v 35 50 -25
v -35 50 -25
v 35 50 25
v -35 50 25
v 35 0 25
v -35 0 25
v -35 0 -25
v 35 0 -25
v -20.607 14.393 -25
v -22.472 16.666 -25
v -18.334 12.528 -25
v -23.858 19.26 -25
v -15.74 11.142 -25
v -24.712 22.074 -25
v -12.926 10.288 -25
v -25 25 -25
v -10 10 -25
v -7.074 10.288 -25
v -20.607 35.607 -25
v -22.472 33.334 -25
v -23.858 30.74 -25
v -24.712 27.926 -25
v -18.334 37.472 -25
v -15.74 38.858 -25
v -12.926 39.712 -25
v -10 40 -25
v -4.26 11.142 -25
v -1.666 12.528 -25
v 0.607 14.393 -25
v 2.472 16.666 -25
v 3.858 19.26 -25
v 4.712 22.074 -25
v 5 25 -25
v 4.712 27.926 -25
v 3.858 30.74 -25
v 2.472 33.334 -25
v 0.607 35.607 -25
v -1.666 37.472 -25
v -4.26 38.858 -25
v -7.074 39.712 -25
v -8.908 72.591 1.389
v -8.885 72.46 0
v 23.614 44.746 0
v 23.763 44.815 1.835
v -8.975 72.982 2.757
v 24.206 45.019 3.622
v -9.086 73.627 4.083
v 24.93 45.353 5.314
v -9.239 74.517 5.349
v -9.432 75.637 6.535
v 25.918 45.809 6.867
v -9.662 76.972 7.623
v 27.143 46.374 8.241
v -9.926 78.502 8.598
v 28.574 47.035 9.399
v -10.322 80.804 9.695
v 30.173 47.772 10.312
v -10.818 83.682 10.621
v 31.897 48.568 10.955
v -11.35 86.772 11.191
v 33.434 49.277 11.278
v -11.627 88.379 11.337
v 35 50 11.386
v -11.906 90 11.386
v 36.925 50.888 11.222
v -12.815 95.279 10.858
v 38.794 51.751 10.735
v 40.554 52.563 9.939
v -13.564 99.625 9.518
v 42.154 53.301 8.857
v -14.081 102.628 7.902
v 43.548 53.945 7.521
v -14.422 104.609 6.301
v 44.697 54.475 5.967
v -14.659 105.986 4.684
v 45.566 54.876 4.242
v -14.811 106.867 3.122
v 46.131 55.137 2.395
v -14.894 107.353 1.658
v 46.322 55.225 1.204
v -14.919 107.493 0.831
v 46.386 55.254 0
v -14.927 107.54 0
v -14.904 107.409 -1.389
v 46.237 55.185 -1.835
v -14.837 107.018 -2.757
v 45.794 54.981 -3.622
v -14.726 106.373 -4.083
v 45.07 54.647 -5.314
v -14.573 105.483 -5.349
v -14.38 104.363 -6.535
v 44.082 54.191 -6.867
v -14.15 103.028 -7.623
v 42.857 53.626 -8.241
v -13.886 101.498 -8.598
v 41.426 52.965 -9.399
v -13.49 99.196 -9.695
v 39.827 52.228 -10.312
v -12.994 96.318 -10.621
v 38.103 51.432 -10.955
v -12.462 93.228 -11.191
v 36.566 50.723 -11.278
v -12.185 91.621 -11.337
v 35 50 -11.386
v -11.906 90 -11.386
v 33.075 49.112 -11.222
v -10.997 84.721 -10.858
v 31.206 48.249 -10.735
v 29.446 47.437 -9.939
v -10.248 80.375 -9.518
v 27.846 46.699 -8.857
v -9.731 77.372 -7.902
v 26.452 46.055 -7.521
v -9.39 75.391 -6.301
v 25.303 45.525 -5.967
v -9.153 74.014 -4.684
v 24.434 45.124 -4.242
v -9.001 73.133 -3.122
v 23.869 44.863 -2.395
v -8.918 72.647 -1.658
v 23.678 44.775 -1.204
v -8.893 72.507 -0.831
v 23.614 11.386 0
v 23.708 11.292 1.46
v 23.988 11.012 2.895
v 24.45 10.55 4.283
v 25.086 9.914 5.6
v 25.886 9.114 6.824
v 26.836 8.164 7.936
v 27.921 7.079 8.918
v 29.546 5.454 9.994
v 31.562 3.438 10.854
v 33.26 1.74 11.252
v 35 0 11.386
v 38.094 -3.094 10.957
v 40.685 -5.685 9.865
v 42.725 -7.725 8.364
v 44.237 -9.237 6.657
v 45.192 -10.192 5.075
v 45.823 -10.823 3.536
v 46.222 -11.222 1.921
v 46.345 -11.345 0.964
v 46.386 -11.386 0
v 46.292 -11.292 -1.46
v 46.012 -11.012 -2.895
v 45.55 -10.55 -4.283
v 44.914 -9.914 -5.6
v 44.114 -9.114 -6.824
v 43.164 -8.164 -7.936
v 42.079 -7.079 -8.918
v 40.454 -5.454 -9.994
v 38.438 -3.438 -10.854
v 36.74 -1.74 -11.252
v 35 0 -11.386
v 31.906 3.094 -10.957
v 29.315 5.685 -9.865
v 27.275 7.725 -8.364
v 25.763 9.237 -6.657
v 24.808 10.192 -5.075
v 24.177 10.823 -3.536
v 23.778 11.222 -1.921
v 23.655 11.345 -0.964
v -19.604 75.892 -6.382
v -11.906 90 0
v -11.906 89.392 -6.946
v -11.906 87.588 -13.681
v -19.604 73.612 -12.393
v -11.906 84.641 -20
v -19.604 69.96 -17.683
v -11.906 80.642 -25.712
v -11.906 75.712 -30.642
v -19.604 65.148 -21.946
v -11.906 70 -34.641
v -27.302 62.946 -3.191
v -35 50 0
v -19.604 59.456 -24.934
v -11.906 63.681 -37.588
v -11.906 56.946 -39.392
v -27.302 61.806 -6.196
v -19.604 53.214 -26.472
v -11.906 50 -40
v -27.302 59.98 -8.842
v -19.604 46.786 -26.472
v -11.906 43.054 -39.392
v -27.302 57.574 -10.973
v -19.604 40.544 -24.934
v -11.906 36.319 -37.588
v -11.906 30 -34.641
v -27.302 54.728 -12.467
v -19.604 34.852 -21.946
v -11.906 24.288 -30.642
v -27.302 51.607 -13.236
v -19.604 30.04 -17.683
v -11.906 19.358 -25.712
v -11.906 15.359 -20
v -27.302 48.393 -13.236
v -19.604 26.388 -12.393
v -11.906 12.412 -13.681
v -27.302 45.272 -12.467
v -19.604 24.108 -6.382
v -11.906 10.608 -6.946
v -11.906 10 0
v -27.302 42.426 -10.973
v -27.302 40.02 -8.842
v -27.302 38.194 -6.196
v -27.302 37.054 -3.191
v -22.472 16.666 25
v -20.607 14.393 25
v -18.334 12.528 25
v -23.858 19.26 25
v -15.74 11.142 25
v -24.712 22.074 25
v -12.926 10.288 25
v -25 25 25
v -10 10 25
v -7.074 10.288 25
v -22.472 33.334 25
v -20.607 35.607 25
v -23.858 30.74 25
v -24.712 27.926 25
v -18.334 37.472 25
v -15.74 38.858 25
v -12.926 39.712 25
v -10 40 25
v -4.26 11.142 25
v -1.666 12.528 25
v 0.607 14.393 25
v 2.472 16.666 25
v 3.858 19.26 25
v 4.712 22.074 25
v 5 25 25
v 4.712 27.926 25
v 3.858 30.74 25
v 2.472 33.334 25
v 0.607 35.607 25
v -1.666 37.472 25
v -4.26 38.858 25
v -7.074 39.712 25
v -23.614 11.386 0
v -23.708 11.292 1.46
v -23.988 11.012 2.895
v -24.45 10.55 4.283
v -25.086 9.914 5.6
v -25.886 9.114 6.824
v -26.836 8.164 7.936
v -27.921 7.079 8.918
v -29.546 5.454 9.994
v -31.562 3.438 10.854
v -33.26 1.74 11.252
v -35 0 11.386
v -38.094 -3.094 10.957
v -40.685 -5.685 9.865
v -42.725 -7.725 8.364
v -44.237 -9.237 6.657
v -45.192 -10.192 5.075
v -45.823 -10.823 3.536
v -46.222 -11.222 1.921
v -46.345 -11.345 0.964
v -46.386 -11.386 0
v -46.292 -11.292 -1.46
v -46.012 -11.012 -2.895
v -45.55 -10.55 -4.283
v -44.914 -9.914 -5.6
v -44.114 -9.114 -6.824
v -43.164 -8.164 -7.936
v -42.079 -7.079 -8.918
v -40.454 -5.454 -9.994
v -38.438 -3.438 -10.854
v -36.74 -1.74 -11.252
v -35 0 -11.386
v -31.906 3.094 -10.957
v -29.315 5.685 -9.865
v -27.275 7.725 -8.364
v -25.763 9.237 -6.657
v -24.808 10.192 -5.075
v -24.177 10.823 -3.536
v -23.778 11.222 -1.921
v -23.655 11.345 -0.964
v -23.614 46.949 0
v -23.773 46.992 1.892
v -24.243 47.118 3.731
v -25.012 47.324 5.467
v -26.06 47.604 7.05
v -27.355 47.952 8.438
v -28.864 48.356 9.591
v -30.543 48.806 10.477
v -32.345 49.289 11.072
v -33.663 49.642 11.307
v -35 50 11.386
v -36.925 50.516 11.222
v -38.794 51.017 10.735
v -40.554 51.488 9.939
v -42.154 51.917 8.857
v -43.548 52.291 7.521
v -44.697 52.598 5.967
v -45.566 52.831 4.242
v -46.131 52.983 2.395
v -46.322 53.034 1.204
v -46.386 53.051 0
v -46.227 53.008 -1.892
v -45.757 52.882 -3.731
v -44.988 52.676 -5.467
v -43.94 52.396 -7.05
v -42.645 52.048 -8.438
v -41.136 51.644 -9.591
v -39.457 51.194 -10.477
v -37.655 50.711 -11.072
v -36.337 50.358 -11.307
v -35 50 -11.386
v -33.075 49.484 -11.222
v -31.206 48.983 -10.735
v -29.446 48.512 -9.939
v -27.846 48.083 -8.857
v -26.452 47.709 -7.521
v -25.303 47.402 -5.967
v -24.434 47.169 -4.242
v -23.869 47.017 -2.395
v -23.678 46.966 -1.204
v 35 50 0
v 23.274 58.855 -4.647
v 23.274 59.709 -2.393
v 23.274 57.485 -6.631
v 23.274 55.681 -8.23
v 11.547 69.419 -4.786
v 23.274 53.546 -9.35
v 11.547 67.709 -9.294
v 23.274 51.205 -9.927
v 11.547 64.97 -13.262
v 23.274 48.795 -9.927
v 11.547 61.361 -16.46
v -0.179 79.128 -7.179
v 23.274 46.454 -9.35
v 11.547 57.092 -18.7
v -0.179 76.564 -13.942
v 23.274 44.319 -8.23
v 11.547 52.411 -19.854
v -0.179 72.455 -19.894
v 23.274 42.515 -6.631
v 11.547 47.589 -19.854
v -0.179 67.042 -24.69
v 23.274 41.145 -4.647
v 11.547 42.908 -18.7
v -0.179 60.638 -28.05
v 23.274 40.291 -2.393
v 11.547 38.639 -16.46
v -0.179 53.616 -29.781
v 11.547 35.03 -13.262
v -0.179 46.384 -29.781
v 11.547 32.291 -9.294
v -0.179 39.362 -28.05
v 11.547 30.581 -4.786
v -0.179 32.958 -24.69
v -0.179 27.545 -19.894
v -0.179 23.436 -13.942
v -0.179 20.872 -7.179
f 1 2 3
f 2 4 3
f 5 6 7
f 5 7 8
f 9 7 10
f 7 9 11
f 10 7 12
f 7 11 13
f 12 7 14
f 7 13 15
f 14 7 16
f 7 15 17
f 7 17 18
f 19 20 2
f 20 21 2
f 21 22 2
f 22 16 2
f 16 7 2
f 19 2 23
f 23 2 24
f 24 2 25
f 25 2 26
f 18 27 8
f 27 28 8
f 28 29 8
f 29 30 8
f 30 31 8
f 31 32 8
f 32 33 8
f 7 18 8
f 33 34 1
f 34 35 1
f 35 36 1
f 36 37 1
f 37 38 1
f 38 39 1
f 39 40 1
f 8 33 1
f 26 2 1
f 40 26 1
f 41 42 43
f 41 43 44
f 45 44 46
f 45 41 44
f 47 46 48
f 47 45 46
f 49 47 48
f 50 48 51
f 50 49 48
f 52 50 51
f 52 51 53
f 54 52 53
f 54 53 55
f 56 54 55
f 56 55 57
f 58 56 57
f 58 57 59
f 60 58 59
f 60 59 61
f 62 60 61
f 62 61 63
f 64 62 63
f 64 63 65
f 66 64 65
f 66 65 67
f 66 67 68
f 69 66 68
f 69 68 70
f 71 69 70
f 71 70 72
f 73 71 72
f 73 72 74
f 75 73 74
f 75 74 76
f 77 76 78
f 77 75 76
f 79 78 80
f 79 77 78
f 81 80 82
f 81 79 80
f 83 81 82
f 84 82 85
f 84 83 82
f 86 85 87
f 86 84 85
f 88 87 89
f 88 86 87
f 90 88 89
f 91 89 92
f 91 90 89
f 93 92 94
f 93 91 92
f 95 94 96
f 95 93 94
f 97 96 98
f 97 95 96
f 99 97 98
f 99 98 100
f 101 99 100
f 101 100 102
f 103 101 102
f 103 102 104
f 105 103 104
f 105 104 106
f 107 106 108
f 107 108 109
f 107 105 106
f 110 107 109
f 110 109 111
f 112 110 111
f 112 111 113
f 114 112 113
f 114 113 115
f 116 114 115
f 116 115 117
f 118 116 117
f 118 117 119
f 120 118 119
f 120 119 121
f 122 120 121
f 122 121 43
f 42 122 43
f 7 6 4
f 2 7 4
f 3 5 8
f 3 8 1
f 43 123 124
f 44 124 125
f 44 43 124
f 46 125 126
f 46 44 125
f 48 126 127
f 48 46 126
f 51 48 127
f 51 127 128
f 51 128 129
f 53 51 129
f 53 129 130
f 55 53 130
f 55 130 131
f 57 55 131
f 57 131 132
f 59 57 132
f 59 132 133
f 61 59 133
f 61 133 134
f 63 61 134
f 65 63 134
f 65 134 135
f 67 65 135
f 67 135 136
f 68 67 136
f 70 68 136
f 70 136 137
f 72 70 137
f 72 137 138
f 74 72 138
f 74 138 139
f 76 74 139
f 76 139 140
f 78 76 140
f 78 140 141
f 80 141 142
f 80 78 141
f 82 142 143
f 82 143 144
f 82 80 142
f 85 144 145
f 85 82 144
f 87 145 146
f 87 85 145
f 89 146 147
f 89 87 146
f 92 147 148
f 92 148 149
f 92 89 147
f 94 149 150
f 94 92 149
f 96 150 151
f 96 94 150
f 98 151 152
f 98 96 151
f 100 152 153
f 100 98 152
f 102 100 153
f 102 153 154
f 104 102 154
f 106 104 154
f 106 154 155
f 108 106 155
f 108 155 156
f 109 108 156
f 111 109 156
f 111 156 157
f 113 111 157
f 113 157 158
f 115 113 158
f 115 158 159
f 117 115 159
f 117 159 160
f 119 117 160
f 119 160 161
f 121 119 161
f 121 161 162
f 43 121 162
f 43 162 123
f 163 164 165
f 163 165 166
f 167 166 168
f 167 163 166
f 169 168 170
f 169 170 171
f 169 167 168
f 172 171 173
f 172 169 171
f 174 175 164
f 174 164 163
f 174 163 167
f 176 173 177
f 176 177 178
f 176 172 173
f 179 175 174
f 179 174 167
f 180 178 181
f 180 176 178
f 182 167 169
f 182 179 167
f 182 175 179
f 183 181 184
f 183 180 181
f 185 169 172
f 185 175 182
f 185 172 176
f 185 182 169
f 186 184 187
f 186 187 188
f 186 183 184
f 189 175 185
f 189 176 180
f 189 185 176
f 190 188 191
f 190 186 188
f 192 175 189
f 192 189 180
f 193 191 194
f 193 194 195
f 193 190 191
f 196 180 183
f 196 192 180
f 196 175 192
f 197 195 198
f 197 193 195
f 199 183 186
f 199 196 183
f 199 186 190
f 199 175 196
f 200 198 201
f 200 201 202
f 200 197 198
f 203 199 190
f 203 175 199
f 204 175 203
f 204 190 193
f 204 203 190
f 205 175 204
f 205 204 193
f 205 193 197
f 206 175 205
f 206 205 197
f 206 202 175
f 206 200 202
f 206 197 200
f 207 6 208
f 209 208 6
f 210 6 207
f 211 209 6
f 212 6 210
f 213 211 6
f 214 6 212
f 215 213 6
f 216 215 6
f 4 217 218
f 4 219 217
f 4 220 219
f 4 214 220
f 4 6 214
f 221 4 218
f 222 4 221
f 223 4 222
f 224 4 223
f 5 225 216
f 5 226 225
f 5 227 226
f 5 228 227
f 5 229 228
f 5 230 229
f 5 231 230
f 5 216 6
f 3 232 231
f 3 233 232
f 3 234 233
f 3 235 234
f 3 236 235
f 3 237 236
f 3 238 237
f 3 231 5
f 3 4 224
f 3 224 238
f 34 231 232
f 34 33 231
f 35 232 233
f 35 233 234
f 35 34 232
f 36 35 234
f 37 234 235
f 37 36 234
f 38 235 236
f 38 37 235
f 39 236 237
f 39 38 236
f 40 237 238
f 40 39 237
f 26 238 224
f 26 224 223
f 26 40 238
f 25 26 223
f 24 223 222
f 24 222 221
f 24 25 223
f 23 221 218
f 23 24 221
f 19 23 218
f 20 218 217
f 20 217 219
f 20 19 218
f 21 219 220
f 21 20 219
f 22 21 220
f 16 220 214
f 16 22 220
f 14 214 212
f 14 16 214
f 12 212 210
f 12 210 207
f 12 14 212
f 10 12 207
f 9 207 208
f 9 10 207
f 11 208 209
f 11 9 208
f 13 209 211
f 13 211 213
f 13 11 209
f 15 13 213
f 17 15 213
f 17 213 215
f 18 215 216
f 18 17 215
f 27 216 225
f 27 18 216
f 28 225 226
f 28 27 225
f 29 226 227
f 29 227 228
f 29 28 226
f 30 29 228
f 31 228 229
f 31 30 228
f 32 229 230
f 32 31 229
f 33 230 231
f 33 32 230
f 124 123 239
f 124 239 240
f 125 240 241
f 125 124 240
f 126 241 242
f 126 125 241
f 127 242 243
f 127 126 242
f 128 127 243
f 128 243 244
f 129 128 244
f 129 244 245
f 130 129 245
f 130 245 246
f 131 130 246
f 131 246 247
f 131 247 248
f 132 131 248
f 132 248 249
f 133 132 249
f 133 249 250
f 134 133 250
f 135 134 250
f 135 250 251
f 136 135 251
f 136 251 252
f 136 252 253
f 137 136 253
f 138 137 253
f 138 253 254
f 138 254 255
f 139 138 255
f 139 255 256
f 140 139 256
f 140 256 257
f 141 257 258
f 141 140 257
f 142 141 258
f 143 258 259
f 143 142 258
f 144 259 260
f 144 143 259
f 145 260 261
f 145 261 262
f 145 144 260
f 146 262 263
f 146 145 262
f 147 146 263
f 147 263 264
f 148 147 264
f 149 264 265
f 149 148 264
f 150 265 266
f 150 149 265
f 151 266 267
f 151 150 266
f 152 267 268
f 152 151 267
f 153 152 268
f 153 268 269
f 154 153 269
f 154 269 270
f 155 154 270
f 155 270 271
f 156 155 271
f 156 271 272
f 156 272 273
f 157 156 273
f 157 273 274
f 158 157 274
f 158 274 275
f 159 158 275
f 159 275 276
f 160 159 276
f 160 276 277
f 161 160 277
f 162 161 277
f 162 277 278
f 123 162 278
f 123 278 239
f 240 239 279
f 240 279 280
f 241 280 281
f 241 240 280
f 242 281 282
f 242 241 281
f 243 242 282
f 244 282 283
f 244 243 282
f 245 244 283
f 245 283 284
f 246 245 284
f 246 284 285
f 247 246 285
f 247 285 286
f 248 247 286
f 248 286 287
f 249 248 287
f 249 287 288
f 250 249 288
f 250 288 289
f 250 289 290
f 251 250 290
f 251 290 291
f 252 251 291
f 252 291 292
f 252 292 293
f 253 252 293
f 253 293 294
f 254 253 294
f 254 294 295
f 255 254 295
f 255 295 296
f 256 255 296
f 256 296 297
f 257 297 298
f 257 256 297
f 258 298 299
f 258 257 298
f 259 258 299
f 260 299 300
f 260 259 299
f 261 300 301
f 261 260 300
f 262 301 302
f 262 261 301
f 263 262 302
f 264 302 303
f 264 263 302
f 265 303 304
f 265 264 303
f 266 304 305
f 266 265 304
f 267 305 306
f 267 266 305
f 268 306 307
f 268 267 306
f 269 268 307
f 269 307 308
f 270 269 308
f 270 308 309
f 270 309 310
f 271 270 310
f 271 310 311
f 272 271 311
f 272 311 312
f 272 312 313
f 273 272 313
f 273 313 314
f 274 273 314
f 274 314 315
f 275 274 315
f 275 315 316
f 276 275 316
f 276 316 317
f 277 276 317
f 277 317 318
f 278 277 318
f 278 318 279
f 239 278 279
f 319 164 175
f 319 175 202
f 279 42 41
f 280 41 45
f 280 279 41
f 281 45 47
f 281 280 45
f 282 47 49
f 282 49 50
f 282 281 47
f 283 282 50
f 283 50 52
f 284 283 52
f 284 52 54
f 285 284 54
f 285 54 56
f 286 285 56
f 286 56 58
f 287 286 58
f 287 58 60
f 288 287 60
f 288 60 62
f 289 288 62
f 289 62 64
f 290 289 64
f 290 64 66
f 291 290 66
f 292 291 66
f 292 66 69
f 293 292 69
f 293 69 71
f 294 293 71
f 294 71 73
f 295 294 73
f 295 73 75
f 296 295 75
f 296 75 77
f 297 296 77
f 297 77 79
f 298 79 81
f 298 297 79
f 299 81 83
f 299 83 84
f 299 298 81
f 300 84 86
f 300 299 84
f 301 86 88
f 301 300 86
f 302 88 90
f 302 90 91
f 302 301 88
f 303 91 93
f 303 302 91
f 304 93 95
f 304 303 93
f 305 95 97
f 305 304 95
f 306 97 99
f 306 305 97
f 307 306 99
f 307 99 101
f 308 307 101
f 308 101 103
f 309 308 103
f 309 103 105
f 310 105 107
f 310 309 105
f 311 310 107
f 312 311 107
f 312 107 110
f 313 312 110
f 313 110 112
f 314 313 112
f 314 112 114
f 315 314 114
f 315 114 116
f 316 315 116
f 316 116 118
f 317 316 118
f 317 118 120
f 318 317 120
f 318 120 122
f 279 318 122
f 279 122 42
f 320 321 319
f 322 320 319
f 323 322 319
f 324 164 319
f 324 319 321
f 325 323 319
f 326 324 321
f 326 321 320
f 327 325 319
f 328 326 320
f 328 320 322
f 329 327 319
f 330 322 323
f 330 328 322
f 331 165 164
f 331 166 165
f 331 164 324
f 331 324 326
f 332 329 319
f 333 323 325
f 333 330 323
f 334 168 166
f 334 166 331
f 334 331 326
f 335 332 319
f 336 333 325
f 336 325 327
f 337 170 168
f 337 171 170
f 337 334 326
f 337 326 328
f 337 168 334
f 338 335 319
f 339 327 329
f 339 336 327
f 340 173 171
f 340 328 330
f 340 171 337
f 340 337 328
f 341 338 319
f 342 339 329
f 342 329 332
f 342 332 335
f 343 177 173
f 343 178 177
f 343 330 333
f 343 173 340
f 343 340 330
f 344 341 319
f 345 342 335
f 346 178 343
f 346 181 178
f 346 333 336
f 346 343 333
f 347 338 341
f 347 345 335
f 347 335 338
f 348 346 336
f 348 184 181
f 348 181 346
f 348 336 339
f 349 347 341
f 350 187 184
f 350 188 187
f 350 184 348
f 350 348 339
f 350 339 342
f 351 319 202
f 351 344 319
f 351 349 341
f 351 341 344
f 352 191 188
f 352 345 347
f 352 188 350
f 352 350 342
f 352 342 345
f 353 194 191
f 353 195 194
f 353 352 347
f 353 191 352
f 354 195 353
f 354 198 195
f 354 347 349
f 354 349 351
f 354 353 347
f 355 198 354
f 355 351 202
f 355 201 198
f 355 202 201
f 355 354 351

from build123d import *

# Parameters (mm, degrees)
F0_W     = 70
F0_H     = 50
F0_R     = 15
F1_DEPTH = 25
F2_ANGLE = 180
F4_R     = 11.3857608402


with BuildPart() as f1:
    # F0 (on Top) → F1 (new body, symmetric)
    with BuildSketch(Plane.XY):
        with Locations((0, 25)):
            Rectangle(F0_W, F0_H)
        with Locations((-10, 25)):
            Circle(F0_R, mode=Mode.SUBTRACT)
    extrude(amount=F1_DEPTH, both=True)


with BuildPart() as f2:
    # F0 (on Top) → F2 (revolve)
    with BuildSketch(Plane.XY):
        Polygon((-11.9059892324, 90), (-35, 50), (35, 50), align=None)
    revolve(axis=Axis((0, 50, 0), (-1, 0, 0)), revolution_arc=F2_ANGLE)


with BuildPart() as f5:
    # F5: sweep along a path in F0
    with BuildLine(Plane.XY) as f5_path:
        Line((-35, 0), (35, 0))
        Line((35, 0), (35, 50))
        Line((35, 50), (-11.9059892324, 90))
        Line((-11.9059892324, 90), (-35, 50))
        Line((-35, 50), (-35, 0))
    # F4 (on plane+point) → F5 (sweep)
    with BuildSketch(Plane.YZ.offset(-35)):
        Circle(F4_R)
    sweep(path=f5_path.line, transition=Transition.RIGHT)


solid = Compound([f1.part, f2.part, f5.part])
